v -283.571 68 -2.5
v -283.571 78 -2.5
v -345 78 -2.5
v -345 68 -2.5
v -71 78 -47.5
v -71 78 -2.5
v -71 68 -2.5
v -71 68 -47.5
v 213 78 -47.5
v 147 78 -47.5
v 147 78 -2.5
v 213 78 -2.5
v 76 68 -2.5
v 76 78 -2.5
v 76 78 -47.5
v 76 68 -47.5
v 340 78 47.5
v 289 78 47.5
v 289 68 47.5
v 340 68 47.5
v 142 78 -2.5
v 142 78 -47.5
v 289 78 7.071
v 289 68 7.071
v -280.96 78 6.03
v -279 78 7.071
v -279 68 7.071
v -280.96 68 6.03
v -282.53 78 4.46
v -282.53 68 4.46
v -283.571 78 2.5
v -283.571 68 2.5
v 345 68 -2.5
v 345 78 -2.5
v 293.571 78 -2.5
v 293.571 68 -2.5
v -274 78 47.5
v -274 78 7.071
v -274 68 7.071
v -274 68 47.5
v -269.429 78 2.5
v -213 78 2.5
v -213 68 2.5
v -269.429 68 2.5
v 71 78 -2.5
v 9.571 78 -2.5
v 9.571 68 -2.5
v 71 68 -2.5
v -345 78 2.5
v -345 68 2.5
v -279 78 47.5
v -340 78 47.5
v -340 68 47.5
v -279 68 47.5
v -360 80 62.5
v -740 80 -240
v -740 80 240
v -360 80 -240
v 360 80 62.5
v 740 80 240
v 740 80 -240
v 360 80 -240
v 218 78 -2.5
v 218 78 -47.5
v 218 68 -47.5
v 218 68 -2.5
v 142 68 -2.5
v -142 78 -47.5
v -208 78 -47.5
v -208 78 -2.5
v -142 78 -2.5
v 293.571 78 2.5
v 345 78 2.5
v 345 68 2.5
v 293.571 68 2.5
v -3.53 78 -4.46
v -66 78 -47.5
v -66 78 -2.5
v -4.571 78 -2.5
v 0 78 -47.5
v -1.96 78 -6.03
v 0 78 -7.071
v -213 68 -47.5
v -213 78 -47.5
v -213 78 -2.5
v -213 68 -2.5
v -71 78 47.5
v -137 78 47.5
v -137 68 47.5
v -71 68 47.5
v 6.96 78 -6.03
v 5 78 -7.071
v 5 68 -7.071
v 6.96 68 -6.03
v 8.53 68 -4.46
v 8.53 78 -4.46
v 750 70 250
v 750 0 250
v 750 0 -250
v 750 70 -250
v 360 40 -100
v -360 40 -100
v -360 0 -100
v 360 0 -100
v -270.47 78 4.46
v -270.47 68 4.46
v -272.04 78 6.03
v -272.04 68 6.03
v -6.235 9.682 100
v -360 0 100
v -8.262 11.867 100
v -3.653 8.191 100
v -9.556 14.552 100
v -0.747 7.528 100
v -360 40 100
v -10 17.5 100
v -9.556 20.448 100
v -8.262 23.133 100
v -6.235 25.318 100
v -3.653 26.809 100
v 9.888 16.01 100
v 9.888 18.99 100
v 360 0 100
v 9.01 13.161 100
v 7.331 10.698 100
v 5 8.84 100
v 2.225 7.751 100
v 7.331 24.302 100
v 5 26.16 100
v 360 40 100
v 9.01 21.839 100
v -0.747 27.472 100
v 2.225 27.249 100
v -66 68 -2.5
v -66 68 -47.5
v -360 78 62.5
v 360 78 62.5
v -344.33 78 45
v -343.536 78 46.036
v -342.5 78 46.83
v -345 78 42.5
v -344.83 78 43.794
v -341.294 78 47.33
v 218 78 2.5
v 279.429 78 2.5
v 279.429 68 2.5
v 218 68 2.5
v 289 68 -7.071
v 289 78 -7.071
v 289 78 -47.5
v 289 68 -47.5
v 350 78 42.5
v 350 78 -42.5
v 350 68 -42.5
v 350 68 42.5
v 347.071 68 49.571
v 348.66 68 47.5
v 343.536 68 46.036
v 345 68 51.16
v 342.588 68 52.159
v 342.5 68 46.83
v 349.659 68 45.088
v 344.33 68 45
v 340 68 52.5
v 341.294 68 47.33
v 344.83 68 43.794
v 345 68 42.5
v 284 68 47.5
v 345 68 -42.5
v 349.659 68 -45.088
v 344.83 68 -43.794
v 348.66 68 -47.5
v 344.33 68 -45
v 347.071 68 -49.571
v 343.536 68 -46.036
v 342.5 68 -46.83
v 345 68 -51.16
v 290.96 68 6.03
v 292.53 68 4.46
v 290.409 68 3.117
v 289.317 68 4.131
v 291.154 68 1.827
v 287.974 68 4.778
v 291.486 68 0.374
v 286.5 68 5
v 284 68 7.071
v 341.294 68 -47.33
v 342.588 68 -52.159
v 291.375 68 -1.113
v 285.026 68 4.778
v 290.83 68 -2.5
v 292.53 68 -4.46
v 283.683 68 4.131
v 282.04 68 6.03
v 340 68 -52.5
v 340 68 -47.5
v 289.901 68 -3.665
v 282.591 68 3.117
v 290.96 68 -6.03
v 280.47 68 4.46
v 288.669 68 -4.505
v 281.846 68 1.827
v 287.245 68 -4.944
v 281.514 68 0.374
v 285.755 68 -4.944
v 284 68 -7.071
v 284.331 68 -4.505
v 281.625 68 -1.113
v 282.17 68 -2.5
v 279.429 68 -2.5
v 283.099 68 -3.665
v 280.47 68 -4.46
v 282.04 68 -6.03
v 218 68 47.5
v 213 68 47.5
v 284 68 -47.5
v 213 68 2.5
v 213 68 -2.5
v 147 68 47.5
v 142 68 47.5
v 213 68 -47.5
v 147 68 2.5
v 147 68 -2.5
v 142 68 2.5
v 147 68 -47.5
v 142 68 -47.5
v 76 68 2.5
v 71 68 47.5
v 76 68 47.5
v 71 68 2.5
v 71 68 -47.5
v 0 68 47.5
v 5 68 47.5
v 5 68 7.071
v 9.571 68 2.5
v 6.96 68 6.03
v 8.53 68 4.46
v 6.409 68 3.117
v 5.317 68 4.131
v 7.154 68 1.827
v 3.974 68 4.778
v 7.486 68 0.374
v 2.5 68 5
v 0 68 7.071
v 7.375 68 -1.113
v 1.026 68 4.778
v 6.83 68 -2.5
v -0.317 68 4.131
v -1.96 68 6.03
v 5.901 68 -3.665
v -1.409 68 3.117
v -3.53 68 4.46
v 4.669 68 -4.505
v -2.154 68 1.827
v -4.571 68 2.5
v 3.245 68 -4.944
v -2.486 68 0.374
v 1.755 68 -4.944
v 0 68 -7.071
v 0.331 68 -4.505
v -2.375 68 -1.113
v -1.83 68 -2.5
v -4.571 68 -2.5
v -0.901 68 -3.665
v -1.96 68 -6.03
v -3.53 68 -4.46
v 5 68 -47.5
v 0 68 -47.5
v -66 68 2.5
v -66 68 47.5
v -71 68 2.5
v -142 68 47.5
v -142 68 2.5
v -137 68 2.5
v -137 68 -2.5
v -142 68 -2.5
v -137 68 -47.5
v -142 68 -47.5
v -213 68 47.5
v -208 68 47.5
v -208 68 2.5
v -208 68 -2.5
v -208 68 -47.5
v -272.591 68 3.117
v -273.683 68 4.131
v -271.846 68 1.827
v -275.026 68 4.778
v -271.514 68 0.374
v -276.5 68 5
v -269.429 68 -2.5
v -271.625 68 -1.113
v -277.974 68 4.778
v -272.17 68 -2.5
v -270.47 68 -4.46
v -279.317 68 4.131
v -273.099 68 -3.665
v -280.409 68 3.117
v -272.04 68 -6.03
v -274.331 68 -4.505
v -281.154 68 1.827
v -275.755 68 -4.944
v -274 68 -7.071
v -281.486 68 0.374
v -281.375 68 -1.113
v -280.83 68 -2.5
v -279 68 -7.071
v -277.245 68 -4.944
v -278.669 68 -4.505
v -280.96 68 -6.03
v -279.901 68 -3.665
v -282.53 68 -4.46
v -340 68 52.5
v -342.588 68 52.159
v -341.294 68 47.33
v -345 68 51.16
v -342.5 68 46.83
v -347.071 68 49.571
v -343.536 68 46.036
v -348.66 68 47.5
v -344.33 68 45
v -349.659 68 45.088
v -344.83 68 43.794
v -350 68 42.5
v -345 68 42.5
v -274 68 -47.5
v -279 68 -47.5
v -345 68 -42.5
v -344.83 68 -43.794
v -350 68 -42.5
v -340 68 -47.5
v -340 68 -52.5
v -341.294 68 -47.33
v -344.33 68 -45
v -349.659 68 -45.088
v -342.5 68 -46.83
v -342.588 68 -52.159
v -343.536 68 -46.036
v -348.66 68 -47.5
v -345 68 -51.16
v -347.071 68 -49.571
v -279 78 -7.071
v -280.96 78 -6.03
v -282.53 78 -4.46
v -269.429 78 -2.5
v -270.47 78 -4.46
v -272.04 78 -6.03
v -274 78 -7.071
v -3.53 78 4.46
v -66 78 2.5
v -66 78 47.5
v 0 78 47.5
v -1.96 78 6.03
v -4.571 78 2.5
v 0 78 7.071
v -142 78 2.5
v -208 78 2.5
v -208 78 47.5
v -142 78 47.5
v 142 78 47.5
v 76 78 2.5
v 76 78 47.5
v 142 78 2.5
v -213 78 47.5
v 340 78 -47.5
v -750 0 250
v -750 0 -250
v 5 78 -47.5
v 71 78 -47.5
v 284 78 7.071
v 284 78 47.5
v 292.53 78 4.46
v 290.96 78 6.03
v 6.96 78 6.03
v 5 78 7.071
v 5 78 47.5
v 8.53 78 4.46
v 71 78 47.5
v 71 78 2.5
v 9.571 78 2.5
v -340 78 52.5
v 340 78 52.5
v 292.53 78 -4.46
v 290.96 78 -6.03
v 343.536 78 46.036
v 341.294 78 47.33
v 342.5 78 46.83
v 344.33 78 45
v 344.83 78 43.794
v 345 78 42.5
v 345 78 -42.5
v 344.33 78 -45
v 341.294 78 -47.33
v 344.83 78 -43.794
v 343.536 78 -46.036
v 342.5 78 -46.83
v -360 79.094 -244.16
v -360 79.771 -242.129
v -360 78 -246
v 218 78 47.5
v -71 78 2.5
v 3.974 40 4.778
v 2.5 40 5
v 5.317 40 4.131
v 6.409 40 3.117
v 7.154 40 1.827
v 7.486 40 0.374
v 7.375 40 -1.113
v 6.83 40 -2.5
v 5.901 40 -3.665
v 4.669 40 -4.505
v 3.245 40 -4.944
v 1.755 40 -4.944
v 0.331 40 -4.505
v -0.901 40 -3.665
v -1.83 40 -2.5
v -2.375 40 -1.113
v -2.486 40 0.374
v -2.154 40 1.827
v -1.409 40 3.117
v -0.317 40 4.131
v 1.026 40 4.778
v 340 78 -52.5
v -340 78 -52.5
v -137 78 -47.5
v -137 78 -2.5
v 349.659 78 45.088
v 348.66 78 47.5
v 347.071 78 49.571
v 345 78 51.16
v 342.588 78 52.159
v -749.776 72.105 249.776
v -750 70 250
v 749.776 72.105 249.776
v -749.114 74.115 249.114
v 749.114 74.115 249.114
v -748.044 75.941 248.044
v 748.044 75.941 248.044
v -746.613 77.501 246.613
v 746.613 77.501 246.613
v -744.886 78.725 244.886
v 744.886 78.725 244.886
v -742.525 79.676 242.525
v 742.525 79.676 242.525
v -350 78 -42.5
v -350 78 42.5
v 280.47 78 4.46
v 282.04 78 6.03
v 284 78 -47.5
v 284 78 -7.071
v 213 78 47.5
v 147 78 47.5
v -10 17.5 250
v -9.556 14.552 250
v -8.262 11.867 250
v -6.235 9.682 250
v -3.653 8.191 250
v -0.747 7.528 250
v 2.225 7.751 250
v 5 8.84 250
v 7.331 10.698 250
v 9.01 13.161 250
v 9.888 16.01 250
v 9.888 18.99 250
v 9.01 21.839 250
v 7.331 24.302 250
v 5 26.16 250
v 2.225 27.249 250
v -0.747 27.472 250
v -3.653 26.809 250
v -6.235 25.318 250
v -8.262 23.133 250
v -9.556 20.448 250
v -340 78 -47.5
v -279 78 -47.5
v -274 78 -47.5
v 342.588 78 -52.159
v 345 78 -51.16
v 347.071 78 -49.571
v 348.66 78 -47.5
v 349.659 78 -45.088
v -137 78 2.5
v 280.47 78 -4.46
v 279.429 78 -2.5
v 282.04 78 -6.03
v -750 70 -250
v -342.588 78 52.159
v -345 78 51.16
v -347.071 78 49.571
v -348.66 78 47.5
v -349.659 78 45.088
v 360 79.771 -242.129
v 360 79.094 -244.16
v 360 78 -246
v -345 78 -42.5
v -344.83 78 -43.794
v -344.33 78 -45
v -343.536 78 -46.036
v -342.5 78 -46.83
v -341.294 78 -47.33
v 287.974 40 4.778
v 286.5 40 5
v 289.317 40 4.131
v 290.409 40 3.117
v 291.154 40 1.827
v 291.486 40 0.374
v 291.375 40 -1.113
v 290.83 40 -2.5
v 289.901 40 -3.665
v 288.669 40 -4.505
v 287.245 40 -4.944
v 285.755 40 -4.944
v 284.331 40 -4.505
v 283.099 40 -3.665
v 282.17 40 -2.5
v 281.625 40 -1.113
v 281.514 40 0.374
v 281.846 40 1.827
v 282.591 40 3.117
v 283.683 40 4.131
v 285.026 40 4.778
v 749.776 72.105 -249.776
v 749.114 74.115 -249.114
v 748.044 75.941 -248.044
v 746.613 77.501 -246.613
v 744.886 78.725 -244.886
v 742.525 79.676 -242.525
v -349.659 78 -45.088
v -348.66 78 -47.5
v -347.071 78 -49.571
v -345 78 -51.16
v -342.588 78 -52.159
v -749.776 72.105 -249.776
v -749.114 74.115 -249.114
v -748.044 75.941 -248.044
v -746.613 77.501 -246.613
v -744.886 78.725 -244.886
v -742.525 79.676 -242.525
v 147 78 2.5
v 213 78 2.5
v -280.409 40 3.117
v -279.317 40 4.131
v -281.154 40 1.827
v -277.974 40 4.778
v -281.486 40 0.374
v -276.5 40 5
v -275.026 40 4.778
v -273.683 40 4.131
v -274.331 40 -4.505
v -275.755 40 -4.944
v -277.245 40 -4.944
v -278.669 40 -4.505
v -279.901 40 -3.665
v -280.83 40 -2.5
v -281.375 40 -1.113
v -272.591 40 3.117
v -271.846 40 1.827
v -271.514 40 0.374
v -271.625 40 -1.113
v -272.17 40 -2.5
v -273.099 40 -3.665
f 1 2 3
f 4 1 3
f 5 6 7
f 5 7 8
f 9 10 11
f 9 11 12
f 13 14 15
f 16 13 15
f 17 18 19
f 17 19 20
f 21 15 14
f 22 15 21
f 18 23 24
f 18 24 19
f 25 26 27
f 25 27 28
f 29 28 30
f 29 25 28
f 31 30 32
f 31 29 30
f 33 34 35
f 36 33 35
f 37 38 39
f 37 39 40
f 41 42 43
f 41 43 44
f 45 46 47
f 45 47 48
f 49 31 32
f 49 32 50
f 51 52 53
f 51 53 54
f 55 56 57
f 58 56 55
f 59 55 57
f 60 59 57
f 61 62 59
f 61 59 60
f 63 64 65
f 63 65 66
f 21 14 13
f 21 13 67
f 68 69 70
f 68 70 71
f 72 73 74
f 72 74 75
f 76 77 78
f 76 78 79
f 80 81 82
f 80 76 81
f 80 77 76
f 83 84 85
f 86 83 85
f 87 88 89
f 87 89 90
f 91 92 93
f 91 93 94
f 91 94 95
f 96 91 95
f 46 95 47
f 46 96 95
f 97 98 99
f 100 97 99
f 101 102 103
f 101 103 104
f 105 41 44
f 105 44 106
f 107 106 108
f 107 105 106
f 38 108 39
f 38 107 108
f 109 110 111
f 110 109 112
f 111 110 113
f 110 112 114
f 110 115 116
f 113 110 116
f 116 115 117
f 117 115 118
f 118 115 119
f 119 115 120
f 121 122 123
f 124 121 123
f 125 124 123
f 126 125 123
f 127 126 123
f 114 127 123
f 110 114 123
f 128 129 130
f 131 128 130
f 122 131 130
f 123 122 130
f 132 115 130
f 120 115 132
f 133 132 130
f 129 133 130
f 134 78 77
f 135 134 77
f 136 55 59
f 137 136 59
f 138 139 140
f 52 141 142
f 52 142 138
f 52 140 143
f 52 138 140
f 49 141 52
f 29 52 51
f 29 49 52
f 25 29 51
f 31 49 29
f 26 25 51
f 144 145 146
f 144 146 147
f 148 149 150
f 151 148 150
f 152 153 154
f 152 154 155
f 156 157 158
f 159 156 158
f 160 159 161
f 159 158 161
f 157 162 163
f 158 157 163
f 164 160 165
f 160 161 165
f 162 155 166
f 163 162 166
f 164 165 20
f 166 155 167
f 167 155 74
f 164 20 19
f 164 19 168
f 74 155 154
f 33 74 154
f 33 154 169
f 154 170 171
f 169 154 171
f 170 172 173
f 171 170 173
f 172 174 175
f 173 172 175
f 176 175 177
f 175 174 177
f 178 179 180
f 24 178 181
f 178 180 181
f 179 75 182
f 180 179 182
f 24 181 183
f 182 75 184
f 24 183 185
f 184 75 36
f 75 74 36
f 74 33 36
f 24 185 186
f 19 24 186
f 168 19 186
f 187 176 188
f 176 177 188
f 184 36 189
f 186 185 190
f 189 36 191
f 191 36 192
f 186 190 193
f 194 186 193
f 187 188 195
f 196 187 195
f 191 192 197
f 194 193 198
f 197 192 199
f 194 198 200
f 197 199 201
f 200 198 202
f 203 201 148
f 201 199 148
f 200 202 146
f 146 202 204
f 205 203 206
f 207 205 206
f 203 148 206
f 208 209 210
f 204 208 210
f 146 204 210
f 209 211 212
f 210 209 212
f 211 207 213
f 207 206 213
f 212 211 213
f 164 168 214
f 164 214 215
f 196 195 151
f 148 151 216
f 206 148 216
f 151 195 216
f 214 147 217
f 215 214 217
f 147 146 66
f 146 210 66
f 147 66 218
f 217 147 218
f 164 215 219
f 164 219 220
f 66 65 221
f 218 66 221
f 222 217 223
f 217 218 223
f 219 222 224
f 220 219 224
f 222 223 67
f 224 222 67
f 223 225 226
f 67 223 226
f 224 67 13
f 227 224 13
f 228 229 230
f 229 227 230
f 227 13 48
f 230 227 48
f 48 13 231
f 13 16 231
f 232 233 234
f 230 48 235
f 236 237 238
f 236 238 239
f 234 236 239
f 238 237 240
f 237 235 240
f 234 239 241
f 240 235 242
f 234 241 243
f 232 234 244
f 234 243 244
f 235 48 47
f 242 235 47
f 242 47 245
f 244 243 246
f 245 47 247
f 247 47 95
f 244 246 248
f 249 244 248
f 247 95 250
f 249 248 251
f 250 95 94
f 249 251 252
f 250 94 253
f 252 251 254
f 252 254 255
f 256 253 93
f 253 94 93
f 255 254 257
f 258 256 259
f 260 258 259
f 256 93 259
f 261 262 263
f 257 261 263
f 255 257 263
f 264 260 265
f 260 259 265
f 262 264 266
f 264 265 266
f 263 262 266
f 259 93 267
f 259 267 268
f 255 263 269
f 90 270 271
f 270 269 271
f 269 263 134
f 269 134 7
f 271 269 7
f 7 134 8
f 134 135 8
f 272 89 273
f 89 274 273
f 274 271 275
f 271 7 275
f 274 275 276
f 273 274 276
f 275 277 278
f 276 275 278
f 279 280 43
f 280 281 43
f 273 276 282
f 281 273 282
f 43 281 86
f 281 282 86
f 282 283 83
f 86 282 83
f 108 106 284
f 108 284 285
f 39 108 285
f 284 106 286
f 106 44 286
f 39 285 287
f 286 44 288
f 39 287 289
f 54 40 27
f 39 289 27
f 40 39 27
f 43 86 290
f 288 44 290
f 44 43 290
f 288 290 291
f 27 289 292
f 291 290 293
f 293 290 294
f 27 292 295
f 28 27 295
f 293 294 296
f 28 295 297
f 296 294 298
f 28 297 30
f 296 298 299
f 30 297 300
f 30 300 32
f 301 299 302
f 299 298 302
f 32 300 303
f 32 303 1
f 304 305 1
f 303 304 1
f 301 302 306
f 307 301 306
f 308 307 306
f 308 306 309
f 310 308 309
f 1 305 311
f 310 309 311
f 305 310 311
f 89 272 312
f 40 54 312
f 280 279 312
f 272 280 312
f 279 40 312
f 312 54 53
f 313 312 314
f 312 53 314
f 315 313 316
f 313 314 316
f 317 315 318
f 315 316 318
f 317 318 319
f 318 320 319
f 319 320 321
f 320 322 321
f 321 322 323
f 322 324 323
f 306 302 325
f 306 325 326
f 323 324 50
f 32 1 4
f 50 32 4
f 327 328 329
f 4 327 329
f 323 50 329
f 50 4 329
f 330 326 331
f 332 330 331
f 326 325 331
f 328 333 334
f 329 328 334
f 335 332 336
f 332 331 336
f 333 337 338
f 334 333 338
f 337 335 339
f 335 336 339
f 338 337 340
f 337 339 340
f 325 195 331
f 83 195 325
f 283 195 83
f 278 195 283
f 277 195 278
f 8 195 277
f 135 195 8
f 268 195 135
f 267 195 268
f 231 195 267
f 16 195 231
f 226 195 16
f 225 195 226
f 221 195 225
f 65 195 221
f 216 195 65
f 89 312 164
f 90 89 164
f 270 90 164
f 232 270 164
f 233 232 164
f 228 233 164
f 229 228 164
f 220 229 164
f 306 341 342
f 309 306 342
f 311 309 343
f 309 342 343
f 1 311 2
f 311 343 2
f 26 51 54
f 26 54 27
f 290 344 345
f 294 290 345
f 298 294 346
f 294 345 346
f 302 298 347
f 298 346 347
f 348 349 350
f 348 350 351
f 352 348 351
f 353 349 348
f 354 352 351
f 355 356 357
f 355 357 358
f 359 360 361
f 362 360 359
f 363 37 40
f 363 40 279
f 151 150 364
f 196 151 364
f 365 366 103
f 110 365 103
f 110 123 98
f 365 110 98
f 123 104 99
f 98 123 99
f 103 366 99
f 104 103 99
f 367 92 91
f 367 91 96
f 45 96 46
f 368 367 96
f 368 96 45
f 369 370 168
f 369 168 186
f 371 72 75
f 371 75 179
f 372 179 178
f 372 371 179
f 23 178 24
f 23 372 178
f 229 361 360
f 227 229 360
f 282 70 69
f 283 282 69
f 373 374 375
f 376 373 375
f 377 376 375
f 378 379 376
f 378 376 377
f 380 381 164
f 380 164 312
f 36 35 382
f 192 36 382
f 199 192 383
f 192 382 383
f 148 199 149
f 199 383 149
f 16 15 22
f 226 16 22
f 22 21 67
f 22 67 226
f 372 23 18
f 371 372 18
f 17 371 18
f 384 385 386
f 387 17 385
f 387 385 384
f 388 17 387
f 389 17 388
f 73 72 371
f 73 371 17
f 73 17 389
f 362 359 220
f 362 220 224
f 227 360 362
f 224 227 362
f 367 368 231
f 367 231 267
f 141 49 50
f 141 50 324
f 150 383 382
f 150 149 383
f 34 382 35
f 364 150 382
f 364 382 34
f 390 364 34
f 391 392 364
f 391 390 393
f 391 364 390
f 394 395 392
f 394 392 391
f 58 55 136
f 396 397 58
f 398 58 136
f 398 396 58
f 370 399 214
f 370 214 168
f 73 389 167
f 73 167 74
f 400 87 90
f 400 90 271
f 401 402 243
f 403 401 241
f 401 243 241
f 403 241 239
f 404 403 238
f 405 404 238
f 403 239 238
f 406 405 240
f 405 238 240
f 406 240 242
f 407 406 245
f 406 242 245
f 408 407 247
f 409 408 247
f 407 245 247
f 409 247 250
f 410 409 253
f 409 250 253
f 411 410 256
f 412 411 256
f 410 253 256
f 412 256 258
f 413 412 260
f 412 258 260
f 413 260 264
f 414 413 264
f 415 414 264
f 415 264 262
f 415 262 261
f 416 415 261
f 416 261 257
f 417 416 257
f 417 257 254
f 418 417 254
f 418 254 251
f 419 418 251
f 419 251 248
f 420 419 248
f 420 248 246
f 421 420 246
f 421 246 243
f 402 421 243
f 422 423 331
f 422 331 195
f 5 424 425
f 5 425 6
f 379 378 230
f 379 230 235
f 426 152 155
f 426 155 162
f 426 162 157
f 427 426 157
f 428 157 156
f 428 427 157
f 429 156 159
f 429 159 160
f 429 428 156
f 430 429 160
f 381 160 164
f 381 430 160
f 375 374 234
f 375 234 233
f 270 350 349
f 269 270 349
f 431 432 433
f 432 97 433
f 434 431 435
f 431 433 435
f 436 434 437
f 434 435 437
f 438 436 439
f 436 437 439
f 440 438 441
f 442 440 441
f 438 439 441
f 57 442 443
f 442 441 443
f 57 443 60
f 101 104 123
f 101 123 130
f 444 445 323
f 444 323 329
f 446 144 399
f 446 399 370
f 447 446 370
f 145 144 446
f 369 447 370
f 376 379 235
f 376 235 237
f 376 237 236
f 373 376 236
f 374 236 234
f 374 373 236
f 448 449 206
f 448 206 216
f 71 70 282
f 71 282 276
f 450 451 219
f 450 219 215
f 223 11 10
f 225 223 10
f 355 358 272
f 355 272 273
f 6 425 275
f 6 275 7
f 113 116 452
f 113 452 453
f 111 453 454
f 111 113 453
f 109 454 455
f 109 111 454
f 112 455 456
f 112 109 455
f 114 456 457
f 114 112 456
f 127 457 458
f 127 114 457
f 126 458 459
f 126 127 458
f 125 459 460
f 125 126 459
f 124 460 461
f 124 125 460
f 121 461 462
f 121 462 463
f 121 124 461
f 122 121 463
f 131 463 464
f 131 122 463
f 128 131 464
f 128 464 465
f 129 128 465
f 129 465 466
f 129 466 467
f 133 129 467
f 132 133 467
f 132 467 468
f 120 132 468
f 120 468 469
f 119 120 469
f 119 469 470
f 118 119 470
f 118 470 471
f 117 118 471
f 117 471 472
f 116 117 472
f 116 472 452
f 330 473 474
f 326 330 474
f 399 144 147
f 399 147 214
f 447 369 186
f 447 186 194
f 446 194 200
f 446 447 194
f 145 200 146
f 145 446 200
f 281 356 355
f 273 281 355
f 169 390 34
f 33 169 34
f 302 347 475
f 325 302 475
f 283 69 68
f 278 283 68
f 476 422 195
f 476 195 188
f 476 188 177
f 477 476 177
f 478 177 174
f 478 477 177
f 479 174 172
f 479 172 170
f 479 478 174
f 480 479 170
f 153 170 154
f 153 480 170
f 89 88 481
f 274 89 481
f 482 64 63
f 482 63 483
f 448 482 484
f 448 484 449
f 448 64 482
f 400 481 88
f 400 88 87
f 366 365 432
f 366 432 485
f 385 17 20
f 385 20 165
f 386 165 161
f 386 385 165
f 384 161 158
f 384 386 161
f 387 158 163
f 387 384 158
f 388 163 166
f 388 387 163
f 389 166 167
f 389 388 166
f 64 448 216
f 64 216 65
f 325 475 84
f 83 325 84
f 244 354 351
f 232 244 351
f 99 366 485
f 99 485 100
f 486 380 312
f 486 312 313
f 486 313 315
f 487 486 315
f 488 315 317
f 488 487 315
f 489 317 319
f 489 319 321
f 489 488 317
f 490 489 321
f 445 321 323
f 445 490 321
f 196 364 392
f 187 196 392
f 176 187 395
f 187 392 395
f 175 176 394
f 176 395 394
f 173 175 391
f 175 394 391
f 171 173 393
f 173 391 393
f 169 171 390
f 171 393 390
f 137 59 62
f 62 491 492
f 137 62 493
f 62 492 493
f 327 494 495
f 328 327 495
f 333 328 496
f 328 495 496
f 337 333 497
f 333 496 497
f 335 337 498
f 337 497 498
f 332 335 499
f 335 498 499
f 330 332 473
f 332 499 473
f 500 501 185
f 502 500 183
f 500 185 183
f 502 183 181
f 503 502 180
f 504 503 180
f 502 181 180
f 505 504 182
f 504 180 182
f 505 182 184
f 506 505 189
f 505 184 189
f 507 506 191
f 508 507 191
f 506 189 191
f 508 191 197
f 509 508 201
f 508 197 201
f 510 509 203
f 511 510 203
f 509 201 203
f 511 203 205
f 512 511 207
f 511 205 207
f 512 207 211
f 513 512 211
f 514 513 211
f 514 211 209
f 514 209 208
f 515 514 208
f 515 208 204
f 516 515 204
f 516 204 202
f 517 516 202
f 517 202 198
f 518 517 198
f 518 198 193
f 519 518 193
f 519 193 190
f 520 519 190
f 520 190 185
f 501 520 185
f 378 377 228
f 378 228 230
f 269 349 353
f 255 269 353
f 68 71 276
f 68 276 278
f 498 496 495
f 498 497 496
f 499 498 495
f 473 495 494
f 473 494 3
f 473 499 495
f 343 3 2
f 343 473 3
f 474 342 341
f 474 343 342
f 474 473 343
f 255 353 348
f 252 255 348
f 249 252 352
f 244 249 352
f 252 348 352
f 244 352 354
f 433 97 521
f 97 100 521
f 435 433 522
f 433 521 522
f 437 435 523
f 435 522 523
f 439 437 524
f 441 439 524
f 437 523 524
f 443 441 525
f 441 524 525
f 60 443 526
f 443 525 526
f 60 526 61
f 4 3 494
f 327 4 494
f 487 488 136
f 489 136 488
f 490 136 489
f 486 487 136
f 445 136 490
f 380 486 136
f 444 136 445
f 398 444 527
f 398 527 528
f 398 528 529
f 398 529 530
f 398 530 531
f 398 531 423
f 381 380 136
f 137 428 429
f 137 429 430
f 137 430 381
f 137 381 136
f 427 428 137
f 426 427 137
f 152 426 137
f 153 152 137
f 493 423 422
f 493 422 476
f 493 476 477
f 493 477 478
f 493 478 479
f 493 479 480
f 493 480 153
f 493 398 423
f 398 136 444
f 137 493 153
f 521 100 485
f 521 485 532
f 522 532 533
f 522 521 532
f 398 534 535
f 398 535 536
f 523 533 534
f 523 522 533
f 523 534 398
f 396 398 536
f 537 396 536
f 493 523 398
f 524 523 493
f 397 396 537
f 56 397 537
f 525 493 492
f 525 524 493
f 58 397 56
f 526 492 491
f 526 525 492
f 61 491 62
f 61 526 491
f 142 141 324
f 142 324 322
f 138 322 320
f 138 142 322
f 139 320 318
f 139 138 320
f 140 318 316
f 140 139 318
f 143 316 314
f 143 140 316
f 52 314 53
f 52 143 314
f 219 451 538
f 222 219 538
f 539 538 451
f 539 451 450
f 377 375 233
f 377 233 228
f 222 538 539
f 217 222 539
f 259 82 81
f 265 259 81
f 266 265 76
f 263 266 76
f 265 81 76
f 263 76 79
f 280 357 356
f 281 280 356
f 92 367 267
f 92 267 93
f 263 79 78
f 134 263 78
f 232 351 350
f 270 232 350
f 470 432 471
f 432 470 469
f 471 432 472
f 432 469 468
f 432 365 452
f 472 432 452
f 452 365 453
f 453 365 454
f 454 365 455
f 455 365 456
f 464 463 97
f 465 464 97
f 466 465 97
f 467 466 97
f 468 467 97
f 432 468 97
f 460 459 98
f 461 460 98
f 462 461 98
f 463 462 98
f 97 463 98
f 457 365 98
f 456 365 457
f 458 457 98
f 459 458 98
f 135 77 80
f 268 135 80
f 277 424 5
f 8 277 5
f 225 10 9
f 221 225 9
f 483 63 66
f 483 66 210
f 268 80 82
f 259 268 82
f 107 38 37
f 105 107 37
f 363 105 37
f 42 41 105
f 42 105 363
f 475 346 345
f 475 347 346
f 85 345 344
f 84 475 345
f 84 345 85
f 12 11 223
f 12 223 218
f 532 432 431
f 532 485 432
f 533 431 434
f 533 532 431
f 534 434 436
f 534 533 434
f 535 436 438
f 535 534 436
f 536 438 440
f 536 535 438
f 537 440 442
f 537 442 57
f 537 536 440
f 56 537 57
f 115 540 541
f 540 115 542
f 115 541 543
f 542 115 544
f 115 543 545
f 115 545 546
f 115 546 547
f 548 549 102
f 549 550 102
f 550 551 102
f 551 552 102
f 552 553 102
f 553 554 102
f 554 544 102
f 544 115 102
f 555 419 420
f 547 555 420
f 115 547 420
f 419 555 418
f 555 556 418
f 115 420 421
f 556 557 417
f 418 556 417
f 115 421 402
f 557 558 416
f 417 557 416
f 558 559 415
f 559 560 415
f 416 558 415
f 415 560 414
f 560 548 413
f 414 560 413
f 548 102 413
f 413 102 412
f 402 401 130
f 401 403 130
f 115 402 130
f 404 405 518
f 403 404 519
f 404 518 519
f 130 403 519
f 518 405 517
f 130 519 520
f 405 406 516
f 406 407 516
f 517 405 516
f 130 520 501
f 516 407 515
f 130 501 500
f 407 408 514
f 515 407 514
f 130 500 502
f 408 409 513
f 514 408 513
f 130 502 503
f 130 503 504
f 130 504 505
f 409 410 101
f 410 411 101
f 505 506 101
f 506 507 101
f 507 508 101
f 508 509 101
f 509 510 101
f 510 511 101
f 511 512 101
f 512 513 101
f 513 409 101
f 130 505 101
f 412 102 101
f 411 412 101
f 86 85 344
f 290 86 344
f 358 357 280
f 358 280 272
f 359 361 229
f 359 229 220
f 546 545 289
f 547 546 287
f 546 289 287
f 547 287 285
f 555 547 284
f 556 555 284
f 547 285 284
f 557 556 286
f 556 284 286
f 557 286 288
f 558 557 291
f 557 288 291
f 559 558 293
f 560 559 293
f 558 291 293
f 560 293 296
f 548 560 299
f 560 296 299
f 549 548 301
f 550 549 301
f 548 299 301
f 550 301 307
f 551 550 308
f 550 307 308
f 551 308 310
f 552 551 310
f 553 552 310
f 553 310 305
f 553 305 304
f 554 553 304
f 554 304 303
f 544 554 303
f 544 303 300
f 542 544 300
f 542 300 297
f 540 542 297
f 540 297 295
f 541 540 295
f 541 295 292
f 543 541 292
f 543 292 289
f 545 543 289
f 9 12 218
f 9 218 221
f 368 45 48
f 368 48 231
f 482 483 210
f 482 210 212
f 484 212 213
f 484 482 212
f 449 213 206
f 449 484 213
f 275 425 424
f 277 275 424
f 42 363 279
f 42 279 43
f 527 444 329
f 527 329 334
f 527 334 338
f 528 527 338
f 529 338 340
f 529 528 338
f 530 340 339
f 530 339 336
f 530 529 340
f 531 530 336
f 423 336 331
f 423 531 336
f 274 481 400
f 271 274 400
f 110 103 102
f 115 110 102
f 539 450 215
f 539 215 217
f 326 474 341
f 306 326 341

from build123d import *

# Parameters (mm, degrees)
SKETCH1_W               = 1500
SKETCH1_H               = 500
BOSS_EXTRUDE1_DEPTH     = 80
FILLET2_R               = 10
CUT_EXTRUDE2_START      = 80
SKETCH7_W               = 720
SKETCH7_H               = 439.016917436
CUT_EXTRUDE2_DEPTH      = 2
CUT_EXTRUDE1_START      = 78
SKETCH5_W               = 66
SKETCH5_H               = 45
CUT_EXTRUDE1_DEPTH      = 10
CUT_EXTRUDE3_START      = 80
SKETCH8_R               = 5
CUT_EXTRUDE3_DEPTH      = 875.606821013
CUT_EXTRUDE4_DEPTH      = 100
CUT_EXTRUDE4_DEPTH_BACK = 100
SKETCH9_W               = 720
SKETCH9_H               = 40
SKETCH11_R              = 10
CUT_EXTRUDE5_DEPTH      = 250


with BuildPart() as part:
    # Sketch1 → Boss-Extrude1 (new body)
    with BuildSketch(Plane(origin=(0, 0, 0), x_dir=(1, 0, 0), z_dir=(0, 1, 0))):
        Rectangle(SKETCH1_W, SKETCH1_H)
    extrude(amount=BOSS_EXTRUDE1_DEPTH)

    # Fillet2
    fillet2_edges = [part.edges().sort_by_distance(p)[0] for p in [
        (-750, 80, 0),
        (0, 80, 250),
        (750, 80, 0),
        (0, 80, -250),
    ]]
    fillet(fillet2_edges, radius=FILLET2_R)

    # Sketch7 → Cut-Extrude2 (cut)
    with BuildSketch(Plane(origin=(0, 0, 0), x_dir=(1, 0, 0), z_dir=(0, 1, 0)).offset(CUT_EXTRUDE2_START)):
        with Locations((0, 157.008458718)):
            Rectangle(SKETCH7_W, SKETCH7_H)
    extrude(amount=-CUT_EXTRUDE2_DEPTH, mode=Mode.SUBTRACT)

    # Sketch5 → Cut-Extrude1 (cut)
    with BuildSketch(Plane(origin=(0, 0, 0), x_dir=(1, 0, 0), z_dir=(0, 1, 0)).offset(CUT_EXTRUDE1_START)):
        with BuildLine():
            Line((-340, 52.5), (340, 52.5))
            ThreePointArc((340, 52.5), (347.071067812, 49.571067812), (350, 42.5))
            Line((350, 42.5), (350, -42.5))
            ThreePointArc((350, -42.5), (347.071067812, -49.571067812), (340, -52.5))
            Line((340, -52.5), (-340, -52.5))
            ThreePointArc((-340, -52.5), (-347.071067812, -49.571067812), (-350, -42.5))
            Line((-350, -42.5), (-350, 42.5))
            ThreePointArc((-350, 42.5), (-347.071067812, 49.571067812), (-340, 52.5))
        make_face()
        with BuildLine():
            Line((-340, 47.5), (-279, 47.5))
            Line((-279, 47.5), (-279, 7.071067812))
            ThreePointArc((-279, 7.071067812), (-281.803300859, 5.303300859), (-283.571067812, 2.5))
            Line((-283.571067812, 2.5), (-345, 2.5))
            Line((-345, 2.5), (-345, 42.5))
            ThreePointArc((-345, 42.5), (-343.535533906, 46.035533906), (-340, 47.5))
        make_face(mode=Mode.SUBTRACT)
        with BuildLine():
            Line((-340, -47.5), (-279, -47.5))
            Line((-279, -47.5), (-279, -7.071067812))
            ThreePointArc((-279, -7.071067812), (-281.803300859, -5.303300859), (-283.571067812, -2.5))
            Line((-283.571067812, -2.5), (-345, -2.5))
            Line((-345, -2.5), (-345, -42.5))
            ThreePointArc((-345, -42.5), (-343.535533906, -46.035533906), (-340, -47.5))
        make_face(mode=Mode.SUBTRACT)
        with BuildLine():
            Line((345, 42.5), (345, 2.5))
            Line((345, 2.5), (293.571067812, 2.5))
            ThreePointArc((293.571067812, 2.5), (291.803300859, 5.303300859), (289, 7.071067812))
            Line((289, 7.071067812), (289, 47.5))
            Line((289, 47.5), (340, 47.5))
            ThreePointArc((340, 47.5), (343.535533906, 46.035533906), (345, 42.5))
        make_face(mode=Mode.SUBTRACT)
        with Locations((-175, -25)):
            Rectangle(SKETCH5_W, SKETCH5_H, mode=Mode.SUBTRACT)
        with BuildLine():
            Line((0, 47.5), (0, 7.071067812))
            ThreePointArc((0, 7.071067812), (-2.803300859, 5.303300859), (-4.571067812, 2.5))
            Line((-4.571067812, 2.5), (-66, 2.5))
            Line((-66, 2.5), (-66, 47.5))
            Line((-66, 47.5), (0, 47.5))
        make_face(mode=Mode.SUBTRACT)
        with BuildLine():
            Line((5, 47.5), (5, 7.071067812))
            ThreePointArc((5, 7.071067812), (7.803300859, 5.303300859), (9.571067812, 2.5))
            Line((9.571067812, 2.5), (71, 2.5))
            Line((71, 2.5), (71, 47.5))
            Line((71, 47.5), (5, 47.5))
        make_face(mode=Mode.SUBTRACT)
        with Locations((-104, 25)):
            Rectangle(SKETCH5_W, SKETCH5_H, mode=Mode.SUBTRACT)
        with Locations((109, 25)):
            Rectangle(SKETCH5_W, SKETCH5_H, mode=Mode.SUBTRACT)
        with Locations((180, 25)):
            Rectangle(SKETCH5_W, SKETCH5_H, mode=Mode.SUBTRACT)
        with BuildLine():
            Line((218, 47.5), (218, 2.5))
            Line((218, 2.5), (279.428932188, 2.5))
            ThreePointArc((279.428932188, 2.5), (281.196699141, 5.303300859), (284, 7.071067812))
            Line((284, 7.071067812), (284, 47.5))
            Line((284, 47.5), (218, 47.5))
        make_face(mode=Mode.SUBTRACT)
        with Locations((-175, 25)):
            Rectangle(SKETCH5_W, SKETCH5_H, mode=Mode.SUBTRACT)
        with BuildLine():
            Line((-213, 47.5), (-213, 2.5))
            Line((-213, 2.5), (-269.428932188, 2.5))
            ThreePointArc((-269.428932188, 2.5), (-271.196699141, 5.303300859), (-274, 7.071067812))
            Line((-274, 7.071067812), (-274, 47.5))
            Line((-274, 47.5), (-213, 47.5))
        make_face(mode=Mode.SUBTRACT)
        with BuildLine():
            Line((-274, -7.071067812), (-274, -47.5))
            Line((-274, -47.5), (-213, -47.5))
            Line((-213, -47.5), (-213, -2.5))
            Line((-213, -2.5), (-269.428932188, -2.5))
            ThreePointArc((-269.428932188, -2.5), (-271.196699141, -5.303300859), (-274, -7.071067812))
        make_face(mode=Mode.SUBTRACT)
        with Locations((-104, -25)):
            Rectangle(SKETCH5_W, SKETCH5_H, mode=Mode.SUBTRACT)
        with BuildLine():
            Line((-66, -2.5), (-4.571067812, -2.5))
            ThreePointArc((-4.571067812, -2.5), (-2.803300859, -5.303300859), (0, -7.071067812))
            Line((0, -7.071067812), (0, -47.5))
            Line((0, -47.5), (-66, -47.5))
            Line((-66, -47.5), (-66, -2.5))
        make_face(mode=Mode.SUBTRACT)
        with BuildLine():
            Line((5, -7.071067812), (5, -47.5))
            Line((5, -47.5), (71, -47.5))
            Line((71, -47.5), (71, -2.5))
            Line((71, -2.5), (9.571067812, -2.5))
            ThreePointArc((9.571067812, -2.5), (7.803300859, -5.303300859), (5, -7.071067812))
        make_face(mode=Mode.SUBTRACT)
        with Locations((109, -25)):
            Rectangle(SKETCH5_W, SKETCH5_H, mode=Mode.SUBTRACT)
        with Locations((180, -25)):
            Rectangle(SKETCH5_W, SKETCH5_H, mode=Mode.SUBTRACT)
        with BuildLine():
            Line((218, -2.5), (218, -47.5))
            Line((218, -47.5), (284, -47.5))
            Line((284, -47.5), (284, -7.071067812))
            ThreePointArc((284, -7.071067812), (281.196699141, -5.303300859), (279.428932188, -2.5))
            Line((279.428932188, -2.5), (218, -2.5))
        make_face(mode=Mode.SUBTRACT)
        with BuildLine():
            Line((289, -7.071067812), (289, -47.5))
            Line((289, -47.5), (340, -47.5))
            ThreePointArc((340, -47.5), (343.535533906, -46.035533906), (345, -42.5))
            Line((345, -42.5), (345, -2.5))
            Line((345, -2.5), (293.571067812, -2.5))
            ThreePointArc((293.571067812, -2.5), (291.803300859, -5.303300859), (289, -7.071067812))
        make_face(mode=Mode.SUBTRACT)
    extrude(amount=-CUT_EXTRUDE1_DEPTH, mode=Mode.SUBTRACT)

    # Sketch8 → Cut-Extrude3 (cut, through all)
    with BuildSketch(Plane(origin=(0, 0, 0), x_dir=(1, 0, 0), z_dir=(0, 1, 0)).offset(CUT_EXTRUDE3_START)):
        with Locations(Location((-276.5, 0, 0), (0, 0, 270))):
            Circle(SKETCH8_R)
        with Locations(Location((2.5, 0, 0), (0, 0, 270))):
            Circle(SKETCH8_R)
        with Locations(Location((286.5, 0, 0), (0, 0, 270))):
            Circle(SKETCH8_R)
    extrude(amount=-CUT_EXTRUDE3_DEPTH, mode=Mode.SUBTRACT)

    # Sketch9 → Cut-Extrude4 (cut, two sides: drawn at the far end of the back side and taken through both)
    with BuildSketch(Plane.XY.offset(-CUT_EXTRUDE4_DEPTH_BACK)):
        with Locations((0, 20)):
            Rectangle(SKETCH9_W, SKETCH9_H)
    extrude(amount=CUT_EXTRUDE4_DEPTH + CUT_EXTRUDE4_DEPTH_BACK, mode=Mode.SUBTRACT)

    # Sketch11 → Cut-Extrude5 (cut)
    with BuildSketch(Plane.XY):
        with Locations(Location((0, 17.5, 0), (0, 0, 180))):
            Circle(SKETCH11_R)
    extrude(amount=CUT_EXTRUDE5_DEPTH, mode=Mode.SUBTRACT)


solid = part.part
